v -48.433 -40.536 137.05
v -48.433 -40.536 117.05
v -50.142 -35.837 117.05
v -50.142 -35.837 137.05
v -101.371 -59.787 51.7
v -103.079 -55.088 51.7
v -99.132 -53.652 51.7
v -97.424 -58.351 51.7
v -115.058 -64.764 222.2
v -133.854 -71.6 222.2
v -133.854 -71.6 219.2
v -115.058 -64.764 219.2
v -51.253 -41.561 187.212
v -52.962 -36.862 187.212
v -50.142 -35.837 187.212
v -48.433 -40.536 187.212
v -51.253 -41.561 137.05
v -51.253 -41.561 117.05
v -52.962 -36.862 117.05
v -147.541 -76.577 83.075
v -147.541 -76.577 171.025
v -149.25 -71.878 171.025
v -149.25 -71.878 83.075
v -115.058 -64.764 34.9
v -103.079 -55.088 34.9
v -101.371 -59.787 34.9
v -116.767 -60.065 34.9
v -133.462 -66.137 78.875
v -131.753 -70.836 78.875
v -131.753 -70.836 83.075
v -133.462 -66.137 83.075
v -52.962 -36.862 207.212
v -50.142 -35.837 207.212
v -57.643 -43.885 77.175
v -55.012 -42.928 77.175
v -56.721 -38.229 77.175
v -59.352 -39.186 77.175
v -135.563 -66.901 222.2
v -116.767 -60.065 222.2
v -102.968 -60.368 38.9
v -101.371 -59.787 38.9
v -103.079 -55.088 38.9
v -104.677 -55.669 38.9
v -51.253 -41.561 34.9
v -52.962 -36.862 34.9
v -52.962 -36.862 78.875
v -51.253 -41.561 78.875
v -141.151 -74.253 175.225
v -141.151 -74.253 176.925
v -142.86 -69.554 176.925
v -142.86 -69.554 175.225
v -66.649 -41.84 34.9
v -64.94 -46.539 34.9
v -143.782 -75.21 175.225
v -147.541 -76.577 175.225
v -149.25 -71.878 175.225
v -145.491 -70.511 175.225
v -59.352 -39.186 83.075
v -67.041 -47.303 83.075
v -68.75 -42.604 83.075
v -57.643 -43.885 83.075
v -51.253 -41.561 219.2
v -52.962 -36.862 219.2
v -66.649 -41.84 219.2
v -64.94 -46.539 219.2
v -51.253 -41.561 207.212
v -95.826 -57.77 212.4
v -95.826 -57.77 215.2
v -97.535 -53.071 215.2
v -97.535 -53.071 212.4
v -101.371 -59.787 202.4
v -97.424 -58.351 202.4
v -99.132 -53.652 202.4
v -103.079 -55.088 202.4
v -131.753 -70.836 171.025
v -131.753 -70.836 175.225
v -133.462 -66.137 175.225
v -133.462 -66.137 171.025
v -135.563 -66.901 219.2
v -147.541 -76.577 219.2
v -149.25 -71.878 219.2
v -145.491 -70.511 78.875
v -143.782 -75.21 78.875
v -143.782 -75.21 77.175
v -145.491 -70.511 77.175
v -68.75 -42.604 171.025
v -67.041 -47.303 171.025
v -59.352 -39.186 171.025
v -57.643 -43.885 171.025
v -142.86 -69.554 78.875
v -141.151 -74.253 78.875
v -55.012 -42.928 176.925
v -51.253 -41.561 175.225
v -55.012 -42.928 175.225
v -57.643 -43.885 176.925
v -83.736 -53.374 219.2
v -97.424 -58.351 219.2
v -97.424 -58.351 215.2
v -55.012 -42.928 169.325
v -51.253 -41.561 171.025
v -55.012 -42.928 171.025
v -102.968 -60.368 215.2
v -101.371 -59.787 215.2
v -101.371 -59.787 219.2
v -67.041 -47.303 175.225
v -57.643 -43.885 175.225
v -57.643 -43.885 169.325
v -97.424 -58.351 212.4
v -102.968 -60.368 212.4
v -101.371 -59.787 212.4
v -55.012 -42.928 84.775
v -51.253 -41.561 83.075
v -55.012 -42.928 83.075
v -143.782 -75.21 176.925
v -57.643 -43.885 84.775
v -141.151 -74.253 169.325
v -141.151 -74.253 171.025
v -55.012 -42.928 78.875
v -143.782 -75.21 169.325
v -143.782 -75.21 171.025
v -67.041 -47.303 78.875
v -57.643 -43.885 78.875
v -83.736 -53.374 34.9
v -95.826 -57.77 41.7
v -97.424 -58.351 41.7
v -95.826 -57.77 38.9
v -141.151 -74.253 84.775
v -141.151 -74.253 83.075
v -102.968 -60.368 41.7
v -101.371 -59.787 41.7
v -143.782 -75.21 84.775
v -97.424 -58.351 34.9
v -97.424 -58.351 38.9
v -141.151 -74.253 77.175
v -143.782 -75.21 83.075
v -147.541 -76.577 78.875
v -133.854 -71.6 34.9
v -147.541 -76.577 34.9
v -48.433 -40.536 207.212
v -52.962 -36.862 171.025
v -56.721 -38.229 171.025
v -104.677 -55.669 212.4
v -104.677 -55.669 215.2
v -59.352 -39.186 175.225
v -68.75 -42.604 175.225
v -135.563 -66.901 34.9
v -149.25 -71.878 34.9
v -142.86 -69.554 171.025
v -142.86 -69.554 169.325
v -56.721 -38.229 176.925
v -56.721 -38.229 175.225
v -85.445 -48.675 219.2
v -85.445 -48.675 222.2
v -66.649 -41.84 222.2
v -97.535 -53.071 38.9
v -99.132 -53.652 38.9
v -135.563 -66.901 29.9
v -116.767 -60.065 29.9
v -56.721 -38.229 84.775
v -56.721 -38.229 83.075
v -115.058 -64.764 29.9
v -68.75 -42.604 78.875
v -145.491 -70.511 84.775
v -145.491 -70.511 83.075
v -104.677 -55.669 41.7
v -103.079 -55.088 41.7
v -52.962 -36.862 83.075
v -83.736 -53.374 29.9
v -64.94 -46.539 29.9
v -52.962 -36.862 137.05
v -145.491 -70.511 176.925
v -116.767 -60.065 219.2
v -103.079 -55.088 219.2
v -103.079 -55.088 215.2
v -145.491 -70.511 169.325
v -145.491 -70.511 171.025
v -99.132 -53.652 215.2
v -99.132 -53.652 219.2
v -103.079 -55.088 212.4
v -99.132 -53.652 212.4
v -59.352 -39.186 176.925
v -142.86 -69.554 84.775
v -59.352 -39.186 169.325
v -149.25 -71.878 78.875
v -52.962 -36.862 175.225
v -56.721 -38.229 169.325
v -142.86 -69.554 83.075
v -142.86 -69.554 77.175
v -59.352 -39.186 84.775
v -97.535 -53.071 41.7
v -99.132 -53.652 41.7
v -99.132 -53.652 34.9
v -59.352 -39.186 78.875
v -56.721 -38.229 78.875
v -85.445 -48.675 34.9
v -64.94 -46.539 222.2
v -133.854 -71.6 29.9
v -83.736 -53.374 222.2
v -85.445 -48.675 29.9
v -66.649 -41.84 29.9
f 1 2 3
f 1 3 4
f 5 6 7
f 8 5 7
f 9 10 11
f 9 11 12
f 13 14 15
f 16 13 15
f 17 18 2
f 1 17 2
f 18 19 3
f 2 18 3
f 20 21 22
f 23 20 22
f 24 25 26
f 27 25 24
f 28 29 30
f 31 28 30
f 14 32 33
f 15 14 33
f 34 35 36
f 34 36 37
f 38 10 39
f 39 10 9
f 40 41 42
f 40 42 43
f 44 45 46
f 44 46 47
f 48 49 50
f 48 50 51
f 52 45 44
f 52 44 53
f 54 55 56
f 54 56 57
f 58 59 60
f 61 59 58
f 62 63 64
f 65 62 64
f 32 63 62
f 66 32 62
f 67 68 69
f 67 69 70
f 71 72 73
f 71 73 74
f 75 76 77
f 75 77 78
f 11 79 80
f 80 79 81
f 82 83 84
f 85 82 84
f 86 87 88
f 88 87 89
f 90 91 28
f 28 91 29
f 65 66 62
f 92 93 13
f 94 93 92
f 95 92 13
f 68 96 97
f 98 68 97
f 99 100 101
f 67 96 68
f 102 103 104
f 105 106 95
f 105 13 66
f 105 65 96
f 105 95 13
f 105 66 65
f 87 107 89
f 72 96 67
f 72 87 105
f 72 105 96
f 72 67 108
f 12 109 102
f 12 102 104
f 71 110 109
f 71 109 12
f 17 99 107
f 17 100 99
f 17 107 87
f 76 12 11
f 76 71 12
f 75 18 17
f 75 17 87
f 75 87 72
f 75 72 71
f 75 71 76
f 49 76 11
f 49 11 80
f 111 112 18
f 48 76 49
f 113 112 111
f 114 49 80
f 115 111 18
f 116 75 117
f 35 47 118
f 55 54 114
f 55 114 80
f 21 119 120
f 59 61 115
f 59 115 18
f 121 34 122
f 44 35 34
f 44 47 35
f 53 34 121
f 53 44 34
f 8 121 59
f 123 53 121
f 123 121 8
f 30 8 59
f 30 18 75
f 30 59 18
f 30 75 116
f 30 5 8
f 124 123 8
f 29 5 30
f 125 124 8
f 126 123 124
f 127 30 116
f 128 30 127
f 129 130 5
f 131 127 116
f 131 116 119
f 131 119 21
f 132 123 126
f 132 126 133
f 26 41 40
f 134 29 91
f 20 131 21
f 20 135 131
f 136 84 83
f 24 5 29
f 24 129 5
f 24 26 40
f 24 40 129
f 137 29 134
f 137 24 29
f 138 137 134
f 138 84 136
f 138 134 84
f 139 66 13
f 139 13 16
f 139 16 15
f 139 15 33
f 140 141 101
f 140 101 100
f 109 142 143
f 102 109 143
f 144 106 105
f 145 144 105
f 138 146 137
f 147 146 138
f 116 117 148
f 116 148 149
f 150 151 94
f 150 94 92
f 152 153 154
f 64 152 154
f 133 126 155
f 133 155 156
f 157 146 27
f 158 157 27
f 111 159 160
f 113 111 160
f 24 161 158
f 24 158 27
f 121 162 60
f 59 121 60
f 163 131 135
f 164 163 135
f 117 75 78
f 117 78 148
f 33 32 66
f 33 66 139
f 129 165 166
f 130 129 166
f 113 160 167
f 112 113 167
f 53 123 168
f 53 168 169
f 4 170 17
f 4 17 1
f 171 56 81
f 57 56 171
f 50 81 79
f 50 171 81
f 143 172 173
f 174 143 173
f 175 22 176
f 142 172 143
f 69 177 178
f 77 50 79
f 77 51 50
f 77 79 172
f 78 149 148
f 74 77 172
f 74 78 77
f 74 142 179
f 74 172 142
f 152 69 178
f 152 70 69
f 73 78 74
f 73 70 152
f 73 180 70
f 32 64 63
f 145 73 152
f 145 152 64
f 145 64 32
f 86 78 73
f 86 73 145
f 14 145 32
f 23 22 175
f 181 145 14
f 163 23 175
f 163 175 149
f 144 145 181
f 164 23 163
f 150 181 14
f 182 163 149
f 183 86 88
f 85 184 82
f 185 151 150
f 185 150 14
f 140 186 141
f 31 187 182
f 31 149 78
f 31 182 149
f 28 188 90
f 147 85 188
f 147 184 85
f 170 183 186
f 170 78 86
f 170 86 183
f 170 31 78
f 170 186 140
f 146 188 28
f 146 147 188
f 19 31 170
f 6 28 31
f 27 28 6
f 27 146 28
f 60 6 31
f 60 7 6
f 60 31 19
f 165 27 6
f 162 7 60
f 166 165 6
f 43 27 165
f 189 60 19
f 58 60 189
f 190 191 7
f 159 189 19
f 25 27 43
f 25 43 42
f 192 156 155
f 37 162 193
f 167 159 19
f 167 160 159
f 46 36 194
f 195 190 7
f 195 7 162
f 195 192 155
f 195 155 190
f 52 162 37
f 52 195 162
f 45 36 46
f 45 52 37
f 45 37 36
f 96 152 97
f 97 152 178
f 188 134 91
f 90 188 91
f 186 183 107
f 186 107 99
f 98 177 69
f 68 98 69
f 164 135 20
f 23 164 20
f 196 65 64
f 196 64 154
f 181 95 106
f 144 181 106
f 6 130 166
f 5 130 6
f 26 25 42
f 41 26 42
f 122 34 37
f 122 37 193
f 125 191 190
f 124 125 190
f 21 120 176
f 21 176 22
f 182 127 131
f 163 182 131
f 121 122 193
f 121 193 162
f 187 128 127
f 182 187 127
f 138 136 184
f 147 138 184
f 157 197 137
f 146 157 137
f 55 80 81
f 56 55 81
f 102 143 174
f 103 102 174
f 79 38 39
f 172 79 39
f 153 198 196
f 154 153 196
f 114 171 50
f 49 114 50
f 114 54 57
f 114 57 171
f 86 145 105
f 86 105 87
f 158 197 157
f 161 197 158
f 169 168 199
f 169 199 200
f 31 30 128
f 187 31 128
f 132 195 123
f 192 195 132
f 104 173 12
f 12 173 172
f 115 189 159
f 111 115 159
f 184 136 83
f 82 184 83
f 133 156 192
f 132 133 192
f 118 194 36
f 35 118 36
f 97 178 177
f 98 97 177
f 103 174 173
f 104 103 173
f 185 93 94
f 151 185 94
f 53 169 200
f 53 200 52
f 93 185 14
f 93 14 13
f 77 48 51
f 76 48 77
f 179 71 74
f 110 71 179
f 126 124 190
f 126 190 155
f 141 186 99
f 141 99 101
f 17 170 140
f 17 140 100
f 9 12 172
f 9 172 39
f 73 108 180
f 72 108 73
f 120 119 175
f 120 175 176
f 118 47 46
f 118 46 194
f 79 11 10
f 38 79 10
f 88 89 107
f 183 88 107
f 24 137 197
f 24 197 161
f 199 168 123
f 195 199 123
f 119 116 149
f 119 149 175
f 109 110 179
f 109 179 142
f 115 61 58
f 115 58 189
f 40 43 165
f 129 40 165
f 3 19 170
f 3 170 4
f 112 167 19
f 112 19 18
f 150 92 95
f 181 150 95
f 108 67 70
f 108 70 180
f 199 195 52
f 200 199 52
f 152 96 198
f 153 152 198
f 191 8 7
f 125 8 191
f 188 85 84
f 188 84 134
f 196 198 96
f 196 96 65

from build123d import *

# Parameters (mm, degrees)
BOSS_EXTRUDE1_DEPTH = 184.3
CUT_EXTRUDE3_DEPTH  = 38.907676661
SKETCH5_W           = 20
SKETCH5_H           = 5
SKETCH5_W_2         = 3
SKETCH5_H_2         = 20
SKETCH5_H_3         = 3
BOSS_EXTRUDE2_DEPTH = 5


with BuildPart() as part:
    # Sketch2 → Boss-Extrude1 (new body)
    with BuildSketch(Plane.XY.offset(34.9)):
        Polygon((-52.961538618, -36.862052104), (-51.252736373, -41.56098761), (-147.541457764, -76.577085001), (-149.250260009, -71.878149495), align=None)
    extrude(amount=BOSS_EXTRUDE1_DEPTH)

    # Sketch4 → Cut-Extrude3 (cut, through all)
    with BuildSketch(Plane(origin=(7.362313595, -20.245196221, 0), x_dir=(-0.939787101, -0.341760449, 0), z_dir=(0.341760449, -0.939787101, 0))):
        Polygon((111.499570088, -34.9), (115.699570088, -34.9), (115.699570088, -38.9), (117.399570088, -38.9), (117.399570088, -41.7), (115.699570088, -41.7), (115.699570088, -51.7), (111.499570088, -51.7), (111.499570088, -41.7), (109.799570088, -41.7), (109.799570088, -38.9), (111.499570088, -38.9), align=None)
        Polygon((62.37056233, -83.075), (62.37056233, -78.875), (66.37056233, -78.875), (66.37056233, -77.175), (69.17056233, -77.175), (69.17056233, -78.875), (79.17056233, -78.875), (79.17056233, -83.075), (69.17056233, -83.075), (69.17056233, -84.775), (66.37056233, -84.775), (66.37056233, -83.075), align=None)
        Polygon((115.699570088, -219.2), (111.499570088, -219.2), (111.499570088, -215.2), (109.799570088, -215.2), (109.799570088, -212.4), (111.499570088, -212.4), (111.499570088, -202.4), (115.699570088, -202.4), (115.699570088, -212.4), (117.399570088, -212.4), (117.399570088, -215.2), (115.699570088, -215.2), align=None)
        Polygon((66.37056233, -175.225), (66.37056233, -176.925), (69.17056233, -176.925), (69.17056233, -175.225), (79.17056233, -175.225), (79.17056233, -171.025), (69.17056233, -171.025), (69.17056233, -169.325), (66.37056233, -169.325), (66.37056233, -171.025), (62.37056233, -171.025), (62.37056233, -175.225), align=None)
        Polygon((164.828577846, -171.025), (164.828577846, -175.225), (160.828577846, -175.225), (160.828577846, -176.925), (158.028577846, -176.925), (158.028577846, -175.225), (148.028577846, -175.225), (148.028577846, -171.025), (158.028577846, -171.025), (158.028577846, -169.325), (160.828577846, -169.325), (160.828577846, -171.025), align=None)
        Polygon((160.828577846, -78.875), (160.828577846, -77.175), (158.028577846, -77.175), (158.028577846, -78.875), (148.028577846, -78.875), (148.028577846, -83.075), (158.028577846, -83.075), (158.028577846, -84.775), (160.828577846, -84.775), (160.828577846, -83.075), (164.828577846, -83.075), (164.828577846, -78.875), align=None)
    extrude(amount=-CUT_EXTRUDE3_DEPTH, mode=Mode.SUBTRACT)

    # Sketch5 → Boss-Extrude2 (add)
    with BuildSketch(Plane(origin=(7.362313595, -20.245196221, 0), x_dir=(0.939787101, 0.341760449, 0), z_dir=(0.341760449, -0.939787101, 0))):
        with Locations((-86.935066209, 32.4)):
            Rectangle(SKETCH5_W, SKETCH5_H)
        with Locations((-140.264073967, 32.4)):
            Rectangle(SKETCH5_W, SKETCH5_H)
        with Locations((-60.87056233, 127.05)):
            Rectangle(SKETCH5_W_2, SKETCH5_H_2)
        with Locations((-60.87056233, 197.2125)):
            Rectangle(SKETCH5_W_2, SKETCH5_H_2)
        with Locations((-86.935066209, 220.7)):
            Rectangle(SKETCH5_W, SKETCH5_H_3)
        with Locations((-140.264073967, 220.7)):
            Rectangle(SKETCH5_W, SKETCH5_H_3)
    extrude(amount=-BOSS_EXTRUDE2_DEPTH)


solid = part.part
